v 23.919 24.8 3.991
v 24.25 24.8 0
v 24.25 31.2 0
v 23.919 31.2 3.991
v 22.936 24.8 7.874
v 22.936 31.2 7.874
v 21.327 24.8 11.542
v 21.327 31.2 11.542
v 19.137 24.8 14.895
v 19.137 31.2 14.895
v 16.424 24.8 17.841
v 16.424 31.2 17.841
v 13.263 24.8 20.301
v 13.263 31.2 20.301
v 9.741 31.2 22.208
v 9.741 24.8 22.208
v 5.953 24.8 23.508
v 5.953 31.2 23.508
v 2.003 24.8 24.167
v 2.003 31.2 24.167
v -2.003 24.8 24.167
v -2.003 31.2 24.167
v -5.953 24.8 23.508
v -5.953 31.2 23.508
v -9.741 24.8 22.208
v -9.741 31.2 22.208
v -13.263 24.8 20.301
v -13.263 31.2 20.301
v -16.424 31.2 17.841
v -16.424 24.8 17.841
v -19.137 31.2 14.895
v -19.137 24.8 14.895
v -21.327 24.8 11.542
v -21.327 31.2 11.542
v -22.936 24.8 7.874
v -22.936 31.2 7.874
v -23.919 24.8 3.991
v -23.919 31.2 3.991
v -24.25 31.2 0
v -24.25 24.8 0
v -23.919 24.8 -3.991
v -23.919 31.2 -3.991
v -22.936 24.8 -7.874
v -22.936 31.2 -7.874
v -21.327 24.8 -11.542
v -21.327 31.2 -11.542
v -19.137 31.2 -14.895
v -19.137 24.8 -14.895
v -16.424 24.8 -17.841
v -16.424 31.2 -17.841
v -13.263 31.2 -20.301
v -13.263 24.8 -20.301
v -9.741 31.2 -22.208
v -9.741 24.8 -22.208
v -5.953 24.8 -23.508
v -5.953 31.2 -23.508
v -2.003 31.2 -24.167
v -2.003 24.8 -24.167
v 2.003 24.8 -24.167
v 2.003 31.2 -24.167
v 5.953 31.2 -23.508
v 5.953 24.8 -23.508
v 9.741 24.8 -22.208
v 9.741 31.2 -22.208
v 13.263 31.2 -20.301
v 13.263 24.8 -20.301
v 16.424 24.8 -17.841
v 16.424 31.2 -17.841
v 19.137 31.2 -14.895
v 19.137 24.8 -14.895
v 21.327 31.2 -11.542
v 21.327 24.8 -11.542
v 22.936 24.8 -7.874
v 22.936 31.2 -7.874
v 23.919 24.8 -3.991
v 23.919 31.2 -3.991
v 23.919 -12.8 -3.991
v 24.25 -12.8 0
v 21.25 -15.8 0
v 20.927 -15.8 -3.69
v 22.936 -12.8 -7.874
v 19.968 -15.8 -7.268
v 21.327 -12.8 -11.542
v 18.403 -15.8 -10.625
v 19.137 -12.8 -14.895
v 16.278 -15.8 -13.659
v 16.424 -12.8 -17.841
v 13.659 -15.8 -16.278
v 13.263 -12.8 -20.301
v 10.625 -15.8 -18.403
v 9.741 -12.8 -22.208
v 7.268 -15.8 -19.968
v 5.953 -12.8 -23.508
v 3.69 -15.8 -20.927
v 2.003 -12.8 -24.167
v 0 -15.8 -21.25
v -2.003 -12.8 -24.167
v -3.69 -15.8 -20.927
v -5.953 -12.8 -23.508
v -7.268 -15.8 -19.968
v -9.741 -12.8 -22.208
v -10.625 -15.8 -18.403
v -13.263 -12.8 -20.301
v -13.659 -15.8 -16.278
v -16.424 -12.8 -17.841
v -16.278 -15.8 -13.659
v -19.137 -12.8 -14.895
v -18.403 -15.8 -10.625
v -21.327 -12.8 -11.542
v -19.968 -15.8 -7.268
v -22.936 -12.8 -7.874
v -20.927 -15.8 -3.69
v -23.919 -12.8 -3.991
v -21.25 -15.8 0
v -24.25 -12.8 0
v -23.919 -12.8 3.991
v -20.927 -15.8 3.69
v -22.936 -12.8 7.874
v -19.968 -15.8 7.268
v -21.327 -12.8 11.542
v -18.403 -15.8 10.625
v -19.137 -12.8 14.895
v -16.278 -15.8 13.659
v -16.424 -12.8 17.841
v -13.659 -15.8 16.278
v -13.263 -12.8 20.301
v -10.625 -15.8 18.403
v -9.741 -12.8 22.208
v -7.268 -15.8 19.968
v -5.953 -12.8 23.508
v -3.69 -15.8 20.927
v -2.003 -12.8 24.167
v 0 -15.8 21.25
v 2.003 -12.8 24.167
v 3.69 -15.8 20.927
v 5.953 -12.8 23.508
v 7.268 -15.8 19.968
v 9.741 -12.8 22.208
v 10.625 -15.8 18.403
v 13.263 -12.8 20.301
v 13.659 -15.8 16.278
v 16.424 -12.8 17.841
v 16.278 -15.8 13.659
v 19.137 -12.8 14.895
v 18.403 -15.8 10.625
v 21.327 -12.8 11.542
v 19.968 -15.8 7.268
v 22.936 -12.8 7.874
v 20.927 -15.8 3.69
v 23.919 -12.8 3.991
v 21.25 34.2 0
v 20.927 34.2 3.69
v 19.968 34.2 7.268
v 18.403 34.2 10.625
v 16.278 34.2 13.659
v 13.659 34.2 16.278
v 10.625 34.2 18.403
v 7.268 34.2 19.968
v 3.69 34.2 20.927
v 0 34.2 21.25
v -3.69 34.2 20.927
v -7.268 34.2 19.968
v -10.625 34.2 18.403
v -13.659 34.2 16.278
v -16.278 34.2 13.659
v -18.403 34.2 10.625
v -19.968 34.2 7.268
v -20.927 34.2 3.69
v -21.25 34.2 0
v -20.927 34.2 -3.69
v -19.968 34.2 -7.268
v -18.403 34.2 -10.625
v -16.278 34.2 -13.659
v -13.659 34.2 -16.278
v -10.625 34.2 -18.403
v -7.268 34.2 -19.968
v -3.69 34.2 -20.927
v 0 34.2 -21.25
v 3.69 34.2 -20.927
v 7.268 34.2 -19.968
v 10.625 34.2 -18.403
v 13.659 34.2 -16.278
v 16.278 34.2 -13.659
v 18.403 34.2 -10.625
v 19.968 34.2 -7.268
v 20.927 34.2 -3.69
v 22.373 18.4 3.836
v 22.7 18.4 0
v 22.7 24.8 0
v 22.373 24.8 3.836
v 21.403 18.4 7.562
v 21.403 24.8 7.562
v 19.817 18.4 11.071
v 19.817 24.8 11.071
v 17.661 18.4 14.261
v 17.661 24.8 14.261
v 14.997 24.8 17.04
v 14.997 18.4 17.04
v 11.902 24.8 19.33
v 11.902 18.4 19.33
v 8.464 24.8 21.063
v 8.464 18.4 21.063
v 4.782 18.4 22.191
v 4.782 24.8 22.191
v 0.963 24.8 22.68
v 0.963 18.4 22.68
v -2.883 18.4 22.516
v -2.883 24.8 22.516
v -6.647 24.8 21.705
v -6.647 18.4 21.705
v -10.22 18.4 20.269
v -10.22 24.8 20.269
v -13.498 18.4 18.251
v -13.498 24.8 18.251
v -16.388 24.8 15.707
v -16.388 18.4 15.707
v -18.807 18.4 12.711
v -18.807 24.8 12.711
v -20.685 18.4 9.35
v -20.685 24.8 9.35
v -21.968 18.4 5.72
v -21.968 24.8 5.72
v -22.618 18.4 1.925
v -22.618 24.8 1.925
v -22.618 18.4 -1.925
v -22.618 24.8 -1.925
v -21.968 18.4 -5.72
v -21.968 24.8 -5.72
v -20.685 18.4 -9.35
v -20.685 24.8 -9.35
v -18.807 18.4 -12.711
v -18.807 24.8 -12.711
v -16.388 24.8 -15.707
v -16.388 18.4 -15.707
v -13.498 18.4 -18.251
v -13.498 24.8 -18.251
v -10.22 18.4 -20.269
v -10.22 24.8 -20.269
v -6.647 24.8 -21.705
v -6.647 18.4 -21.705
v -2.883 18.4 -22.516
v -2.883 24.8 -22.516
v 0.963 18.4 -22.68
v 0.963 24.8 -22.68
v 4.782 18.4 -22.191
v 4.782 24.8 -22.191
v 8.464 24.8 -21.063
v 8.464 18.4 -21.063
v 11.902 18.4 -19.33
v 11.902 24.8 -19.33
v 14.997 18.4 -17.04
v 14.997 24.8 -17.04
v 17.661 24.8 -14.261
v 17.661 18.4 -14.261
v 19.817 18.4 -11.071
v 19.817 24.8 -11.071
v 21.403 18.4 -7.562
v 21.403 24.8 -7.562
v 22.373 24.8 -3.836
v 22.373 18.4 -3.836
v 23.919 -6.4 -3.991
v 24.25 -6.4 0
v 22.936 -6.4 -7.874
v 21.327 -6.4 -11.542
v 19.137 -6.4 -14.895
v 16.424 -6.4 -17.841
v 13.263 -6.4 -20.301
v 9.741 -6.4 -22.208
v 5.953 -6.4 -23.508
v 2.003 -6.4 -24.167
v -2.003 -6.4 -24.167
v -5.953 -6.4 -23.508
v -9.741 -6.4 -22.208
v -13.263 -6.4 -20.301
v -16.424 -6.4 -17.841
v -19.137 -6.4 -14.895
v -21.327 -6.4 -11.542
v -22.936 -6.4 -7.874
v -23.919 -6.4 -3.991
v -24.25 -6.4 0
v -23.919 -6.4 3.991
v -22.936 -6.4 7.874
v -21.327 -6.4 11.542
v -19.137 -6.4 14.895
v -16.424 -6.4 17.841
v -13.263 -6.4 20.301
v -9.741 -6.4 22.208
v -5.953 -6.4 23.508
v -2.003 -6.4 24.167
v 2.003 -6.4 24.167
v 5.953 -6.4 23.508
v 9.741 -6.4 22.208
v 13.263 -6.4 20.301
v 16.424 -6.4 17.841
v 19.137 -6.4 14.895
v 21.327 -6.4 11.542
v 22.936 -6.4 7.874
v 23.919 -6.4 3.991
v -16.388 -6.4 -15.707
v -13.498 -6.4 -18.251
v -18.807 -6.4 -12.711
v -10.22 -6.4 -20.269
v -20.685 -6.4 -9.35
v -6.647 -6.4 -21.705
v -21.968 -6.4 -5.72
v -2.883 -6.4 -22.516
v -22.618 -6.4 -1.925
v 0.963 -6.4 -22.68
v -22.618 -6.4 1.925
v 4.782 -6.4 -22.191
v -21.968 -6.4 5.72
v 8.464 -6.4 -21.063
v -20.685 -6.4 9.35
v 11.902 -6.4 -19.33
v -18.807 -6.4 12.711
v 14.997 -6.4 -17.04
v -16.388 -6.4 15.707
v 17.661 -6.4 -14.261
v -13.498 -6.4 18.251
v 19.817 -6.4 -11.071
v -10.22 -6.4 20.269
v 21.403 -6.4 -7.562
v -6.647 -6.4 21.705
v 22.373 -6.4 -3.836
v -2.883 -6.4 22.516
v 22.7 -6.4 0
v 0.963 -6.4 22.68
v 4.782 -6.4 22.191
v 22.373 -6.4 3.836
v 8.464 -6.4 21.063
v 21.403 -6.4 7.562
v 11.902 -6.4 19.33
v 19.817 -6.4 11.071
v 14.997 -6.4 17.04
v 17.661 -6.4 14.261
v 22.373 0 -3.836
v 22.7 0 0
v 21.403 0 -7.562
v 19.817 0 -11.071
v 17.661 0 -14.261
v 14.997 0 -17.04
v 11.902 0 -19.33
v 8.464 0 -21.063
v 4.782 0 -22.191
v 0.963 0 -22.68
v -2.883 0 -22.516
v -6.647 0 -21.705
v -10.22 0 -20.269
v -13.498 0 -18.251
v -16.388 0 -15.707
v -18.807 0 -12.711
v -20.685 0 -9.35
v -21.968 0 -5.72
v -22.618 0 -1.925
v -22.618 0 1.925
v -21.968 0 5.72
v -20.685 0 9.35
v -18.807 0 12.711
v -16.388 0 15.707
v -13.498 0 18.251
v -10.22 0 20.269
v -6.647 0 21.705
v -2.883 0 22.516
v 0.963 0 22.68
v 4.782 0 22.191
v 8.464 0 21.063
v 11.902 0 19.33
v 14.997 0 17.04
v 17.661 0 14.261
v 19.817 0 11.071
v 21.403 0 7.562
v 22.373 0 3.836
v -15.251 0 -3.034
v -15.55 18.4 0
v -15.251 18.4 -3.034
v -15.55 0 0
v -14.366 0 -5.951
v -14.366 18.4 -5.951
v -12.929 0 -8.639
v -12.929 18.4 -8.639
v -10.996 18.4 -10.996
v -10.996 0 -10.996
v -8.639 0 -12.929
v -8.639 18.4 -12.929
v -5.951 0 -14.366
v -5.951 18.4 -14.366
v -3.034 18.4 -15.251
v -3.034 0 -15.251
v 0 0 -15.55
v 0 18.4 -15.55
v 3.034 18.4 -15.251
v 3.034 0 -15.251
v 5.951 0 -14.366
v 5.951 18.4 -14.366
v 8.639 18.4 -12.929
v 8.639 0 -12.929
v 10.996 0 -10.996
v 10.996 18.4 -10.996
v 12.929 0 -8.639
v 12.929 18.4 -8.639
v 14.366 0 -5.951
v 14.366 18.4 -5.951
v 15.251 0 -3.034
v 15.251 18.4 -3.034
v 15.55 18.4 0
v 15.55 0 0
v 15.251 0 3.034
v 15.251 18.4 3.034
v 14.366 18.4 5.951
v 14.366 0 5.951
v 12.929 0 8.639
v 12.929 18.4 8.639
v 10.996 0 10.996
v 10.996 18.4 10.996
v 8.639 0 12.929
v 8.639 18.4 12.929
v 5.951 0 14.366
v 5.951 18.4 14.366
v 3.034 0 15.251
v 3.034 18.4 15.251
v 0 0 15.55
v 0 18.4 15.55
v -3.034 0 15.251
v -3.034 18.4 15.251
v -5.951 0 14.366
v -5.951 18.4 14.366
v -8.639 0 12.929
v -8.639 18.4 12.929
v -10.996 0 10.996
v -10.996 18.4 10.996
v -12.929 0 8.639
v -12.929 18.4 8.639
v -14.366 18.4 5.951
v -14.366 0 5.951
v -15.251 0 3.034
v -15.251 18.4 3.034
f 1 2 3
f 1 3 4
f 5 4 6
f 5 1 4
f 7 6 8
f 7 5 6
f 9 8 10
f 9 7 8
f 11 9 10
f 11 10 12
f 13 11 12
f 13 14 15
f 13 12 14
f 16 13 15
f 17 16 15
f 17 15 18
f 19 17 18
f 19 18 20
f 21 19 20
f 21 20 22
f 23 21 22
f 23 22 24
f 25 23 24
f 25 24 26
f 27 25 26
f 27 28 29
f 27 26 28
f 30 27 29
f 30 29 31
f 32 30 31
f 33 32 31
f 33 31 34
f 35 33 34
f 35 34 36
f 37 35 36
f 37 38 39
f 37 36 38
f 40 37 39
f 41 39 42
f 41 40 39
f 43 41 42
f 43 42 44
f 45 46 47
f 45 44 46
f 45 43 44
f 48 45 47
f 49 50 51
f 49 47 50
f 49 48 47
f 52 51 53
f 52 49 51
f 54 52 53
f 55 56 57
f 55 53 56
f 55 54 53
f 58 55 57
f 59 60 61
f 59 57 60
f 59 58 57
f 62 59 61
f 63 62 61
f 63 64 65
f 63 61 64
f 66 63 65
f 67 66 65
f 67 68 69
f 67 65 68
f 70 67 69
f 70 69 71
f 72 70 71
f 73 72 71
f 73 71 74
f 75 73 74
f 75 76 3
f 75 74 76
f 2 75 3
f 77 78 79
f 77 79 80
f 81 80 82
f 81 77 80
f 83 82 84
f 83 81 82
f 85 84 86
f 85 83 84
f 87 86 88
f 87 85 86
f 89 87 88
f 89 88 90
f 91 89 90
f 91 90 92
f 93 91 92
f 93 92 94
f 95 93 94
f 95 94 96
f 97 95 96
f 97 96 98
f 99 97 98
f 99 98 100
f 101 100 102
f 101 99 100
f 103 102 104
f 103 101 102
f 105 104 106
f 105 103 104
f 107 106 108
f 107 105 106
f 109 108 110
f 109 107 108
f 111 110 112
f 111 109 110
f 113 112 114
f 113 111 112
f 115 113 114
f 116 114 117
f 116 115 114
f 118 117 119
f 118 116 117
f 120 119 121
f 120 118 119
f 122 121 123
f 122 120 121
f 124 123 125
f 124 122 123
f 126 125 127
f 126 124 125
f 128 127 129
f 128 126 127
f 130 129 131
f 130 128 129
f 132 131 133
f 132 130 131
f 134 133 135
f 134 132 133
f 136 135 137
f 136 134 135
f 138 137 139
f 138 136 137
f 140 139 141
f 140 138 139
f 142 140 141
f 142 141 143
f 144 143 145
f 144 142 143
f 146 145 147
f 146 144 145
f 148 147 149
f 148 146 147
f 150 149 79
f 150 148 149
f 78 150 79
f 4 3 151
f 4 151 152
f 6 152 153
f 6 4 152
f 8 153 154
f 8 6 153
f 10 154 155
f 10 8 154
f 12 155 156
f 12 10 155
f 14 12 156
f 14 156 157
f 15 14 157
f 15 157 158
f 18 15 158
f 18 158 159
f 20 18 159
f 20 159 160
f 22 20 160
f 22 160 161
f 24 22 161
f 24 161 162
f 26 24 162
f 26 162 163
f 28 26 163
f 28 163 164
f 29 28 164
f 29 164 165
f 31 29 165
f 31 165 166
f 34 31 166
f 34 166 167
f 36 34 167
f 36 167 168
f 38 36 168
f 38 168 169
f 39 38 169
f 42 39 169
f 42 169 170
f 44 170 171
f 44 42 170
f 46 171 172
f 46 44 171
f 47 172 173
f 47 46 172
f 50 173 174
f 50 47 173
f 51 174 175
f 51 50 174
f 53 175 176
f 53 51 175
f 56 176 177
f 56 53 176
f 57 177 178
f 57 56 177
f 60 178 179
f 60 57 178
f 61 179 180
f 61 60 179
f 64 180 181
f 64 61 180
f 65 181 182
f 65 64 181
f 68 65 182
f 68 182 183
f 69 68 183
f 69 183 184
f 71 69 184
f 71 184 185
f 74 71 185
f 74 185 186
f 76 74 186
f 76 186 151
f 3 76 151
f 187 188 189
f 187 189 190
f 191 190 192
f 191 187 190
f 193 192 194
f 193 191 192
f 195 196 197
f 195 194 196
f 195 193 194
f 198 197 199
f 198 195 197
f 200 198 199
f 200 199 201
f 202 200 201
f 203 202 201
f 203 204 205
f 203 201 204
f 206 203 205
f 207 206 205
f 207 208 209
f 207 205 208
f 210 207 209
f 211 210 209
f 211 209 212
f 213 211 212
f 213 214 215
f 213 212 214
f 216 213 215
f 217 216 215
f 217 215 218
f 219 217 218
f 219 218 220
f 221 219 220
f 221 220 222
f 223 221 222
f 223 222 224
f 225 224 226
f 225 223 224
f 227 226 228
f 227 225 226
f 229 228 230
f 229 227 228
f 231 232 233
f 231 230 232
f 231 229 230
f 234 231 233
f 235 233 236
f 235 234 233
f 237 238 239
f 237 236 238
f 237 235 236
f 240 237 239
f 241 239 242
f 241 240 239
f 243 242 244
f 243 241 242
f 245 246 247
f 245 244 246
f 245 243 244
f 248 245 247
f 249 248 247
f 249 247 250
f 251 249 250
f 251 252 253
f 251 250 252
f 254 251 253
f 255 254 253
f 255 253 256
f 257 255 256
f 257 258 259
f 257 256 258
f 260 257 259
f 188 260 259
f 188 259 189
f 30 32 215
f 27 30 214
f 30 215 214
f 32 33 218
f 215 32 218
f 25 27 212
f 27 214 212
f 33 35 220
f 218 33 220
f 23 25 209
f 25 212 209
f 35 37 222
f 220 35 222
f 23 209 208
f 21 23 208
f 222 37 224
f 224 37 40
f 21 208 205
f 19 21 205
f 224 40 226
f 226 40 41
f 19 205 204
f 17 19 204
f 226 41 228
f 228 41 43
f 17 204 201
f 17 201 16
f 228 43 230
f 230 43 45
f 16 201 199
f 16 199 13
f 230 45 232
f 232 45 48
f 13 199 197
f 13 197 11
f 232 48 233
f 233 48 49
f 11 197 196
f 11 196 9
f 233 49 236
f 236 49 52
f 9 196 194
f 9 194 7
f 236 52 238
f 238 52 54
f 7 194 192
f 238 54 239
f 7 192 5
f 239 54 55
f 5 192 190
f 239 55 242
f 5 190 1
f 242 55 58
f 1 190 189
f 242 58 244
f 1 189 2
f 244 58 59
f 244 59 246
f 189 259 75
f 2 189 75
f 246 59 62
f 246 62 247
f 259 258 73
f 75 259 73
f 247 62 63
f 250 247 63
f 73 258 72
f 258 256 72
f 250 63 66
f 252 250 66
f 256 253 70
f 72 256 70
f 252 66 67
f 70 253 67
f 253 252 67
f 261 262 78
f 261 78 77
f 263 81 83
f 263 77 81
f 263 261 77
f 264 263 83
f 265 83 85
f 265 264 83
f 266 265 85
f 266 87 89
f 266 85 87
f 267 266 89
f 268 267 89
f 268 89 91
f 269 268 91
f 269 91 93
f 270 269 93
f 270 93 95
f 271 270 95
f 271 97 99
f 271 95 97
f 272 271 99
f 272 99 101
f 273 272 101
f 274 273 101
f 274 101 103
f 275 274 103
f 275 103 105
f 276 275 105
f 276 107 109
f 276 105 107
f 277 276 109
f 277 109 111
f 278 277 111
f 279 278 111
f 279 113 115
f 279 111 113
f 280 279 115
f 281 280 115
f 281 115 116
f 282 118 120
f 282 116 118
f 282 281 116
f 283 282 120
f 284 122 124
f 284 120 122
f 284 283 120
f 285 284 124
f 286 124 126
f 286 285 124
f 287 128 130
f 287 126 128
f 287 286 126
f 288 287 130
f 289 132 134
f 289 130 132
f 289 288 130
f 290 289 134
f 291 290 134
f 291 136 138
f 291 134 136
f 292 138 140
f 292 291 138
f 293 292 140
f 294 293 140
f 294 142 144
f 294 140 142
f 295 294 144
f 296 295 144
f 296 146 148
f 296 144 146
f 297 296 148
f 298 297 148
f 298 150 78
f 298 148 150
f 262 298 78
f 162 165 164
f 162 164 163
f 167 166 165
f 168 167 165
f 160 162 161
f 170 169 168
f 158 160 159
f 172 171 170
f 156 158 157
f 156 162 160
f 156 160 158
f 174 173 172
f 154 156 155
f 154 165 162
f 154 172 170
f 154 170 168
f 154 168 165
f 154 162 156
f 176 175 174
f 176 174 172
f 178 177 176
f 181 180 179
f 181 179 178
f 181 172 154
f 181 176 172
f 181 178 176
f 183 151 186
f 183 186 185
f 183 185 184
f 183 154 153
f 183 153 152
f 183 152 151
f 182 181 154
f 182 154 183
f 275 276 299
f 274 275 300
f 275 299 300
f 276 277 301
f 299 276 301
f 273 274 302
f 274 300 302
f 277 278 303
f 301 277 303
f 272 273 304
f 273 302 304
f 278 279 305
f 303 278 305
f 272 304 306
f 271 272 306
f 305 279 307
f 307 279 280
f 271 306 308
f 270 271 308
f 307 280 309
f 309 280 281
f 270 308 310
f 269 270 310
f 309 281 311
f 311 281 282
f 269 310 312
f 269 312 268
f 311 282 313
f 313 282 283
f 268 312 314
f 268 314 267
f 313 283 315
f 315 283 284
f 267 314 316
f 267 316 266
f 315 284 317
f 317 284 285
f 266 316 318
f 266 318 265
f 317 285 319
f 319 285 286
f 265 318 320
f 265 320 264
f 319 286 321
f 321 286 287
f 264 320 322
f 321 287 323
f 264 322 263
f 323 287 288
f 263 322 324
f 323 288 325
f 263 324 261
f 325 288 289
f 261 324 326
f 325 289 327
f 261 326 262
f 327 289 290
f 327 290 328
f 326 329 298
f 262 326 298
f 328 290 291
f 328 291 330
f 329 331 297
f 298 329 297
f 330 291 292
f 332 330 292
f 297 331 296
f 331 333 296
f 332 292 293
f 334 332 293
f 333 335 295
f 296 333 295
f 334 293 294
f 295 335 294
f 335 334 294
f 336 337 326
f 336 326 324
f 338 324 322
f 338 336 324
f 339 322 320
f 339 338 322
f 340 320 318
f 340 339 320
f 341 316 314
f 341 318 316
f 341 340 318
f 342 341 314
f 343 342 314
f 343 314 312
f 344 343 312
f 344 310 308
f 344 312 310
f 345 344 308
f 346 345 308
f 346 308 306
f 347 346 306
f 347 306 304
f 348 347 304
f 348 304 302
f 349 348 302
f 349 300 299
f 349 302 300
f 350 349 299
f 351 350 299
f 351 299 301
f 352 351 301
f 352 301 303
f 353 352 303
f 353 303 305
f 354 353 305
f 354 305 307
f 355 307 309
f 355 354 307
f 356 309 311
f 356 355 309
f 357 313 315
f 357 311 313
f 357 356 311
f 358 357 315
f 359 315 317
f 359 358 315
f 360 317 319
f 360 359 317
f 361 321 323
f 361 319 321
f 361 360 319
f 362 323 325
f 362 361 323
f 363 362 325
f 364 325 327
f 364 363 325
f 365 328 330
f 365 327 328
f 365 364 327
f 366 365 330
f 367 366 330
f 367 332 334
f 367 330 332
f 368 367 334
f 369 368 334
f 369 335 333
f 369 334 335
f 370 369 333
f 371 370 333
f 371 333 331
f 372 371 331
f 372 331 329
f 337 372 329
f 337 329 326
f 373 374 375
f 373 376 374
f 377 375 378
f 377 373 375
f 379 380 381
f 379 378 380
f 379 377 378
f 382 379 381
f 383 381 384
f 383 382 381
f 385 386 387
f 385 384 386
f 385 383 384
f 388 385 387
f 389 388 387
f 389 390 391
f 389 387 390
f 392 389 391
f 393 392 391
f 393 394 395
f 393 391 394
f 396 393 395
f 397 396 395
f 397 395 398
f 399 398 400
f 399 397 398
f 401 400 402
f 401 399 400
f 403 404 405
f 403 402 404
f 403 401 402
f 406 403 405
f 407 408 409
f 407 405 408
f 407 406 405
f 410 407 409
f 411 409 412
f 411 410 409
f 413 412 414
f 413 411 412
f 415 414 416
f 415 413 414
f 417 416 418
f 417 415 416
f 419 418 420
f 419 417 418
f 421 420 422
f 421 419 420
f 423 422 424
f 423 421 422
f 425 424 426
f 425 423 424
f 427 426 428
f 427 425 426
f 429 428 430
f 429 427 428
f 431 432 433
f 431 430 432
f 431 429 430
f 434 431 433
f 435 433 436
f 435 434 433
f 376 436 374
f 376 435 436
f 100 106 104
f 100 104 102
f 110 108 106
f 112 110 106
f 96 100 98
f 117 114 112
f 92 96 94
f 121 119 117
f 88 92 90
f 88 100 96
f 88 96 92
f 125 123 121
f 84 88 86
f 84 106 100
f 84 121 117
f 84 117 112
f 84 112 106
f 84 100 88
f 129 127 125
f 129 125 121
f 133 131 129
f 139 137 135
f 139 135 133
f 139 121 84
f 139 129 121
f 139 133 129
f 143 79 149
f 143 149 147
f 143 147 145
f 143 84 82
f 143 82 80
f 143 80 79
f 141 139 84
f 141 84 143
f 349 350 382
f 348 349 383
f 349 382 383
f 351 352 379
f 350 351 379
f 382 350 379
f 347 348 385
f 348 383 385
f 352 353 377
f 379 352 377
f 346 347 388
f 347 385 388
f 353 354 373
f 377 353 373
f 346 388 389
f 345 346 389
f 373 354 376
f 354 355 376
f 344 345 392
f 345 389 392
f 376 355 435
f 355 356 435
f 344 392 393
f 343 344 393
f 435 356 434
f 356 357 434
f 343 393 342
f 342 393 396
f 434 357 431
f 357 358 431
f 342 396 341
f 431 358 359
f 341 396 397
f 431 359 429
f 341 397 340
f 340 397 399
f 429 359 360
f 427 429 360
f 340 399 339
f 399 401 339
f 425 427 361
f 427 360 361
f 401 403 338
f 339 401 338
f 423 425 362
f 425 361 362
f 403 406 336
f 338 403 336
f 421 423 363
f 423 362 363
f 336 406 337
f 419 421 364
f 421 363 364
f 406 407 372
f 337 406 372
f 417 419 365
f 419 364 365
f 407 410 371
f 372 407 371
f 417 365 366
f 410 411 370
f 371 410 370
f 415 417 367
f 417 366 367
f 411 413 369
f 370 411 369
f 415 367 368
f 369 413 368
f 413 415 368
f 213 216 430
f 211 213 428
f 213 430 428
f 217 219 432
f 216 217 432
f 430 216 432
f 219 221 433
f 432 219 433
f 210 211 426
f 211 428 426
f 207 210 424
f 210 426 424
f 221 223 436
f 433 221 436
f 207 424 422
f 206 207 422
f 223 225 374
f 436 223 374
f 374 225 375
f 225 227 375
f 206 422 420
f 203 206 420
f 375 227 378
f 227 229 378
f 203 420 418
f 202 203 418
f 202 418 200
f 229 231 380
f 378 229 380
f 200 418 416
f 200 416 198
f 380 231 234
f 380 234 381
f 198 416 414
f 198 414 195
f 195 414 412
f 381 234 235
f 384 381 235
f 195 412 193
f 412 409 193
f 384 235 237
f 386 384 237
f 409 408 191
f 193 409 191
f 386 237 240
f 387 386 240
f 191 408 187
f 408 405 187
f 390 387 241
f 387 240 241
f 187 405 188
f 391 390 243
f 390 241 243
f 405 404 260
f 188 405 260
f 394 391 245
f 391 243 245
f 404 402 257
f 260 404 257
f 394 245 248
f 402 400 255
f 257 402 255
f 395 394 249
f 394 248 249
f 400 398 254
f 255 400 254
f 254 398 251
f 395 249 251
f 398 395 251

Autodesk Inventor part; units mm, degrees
ref_plane "YZ Plane" through (0, 0, 0) normal (1, 0, 0) x (0, 1, 0)
ref_plane "XZ Plane" through (0, 0, 0) normal (0, 1, 0) x (-1, 0, 0)
ref_plane "XY Plane" through (0, 0, 0) normal (0, 0, 1) x (1, 0, 0)
sketch "Sketch1" plane through (0, 0, 0) normal (0, 1, 0) x (-1, 0, 0)
  circle A0 centre (0, 0) radius 15.55
  dimension "d1" = 31.1
extrude "Extrusion1" add sketch "Sketch1" along normal blind 18.4
sketch "Sketch2" plane through (0, 18.4, 0) normal (0, 1, 0) x (1, 0, 0)
  circle A0 centre (0, 0) radius 22.7
  dimension "d4" = 45.4
extrude "Extrusion2" add sketch "Sketch2" along normal blind 6.4
sketch "Sketch3" plane through (0, 24.8, 0) normal (0, 1, 0) x (1, 0, 0)
  circle A0 centre (0, 0) radius 24.25
  dimension "d7" = 48.5
extrude "Extrusion3" add sketch "Sketch3" along normal blind 9.4
sketch "Sketch4" plane through (0, 0, 0) normal (0, -1, 0) x (1, 0, 0)
  circle A0 centre (0, 0) radius 22.7
extrude "Extrusion4" add sketch "Sketch4" along normal blind 6.4
sketch "Sketch5" plane through (0, -6.4, 0) normal (0, -1, 0) x (1, 0, 0)
  circle A0 centre (0, 0) radius 24.25
extrude "Extrusion5" add sketch "Sketch5" along normal blind 9.4
chamfer "Chamfer1" distance 3 angle 45 1 edges at (-24.25, 34.2, 0)
chamfer "Chamfer2" distance 3 angle 45 1 edges at (-24.25, -15.8, 0)
properties part number "Hydraulic cylinder part 2"
